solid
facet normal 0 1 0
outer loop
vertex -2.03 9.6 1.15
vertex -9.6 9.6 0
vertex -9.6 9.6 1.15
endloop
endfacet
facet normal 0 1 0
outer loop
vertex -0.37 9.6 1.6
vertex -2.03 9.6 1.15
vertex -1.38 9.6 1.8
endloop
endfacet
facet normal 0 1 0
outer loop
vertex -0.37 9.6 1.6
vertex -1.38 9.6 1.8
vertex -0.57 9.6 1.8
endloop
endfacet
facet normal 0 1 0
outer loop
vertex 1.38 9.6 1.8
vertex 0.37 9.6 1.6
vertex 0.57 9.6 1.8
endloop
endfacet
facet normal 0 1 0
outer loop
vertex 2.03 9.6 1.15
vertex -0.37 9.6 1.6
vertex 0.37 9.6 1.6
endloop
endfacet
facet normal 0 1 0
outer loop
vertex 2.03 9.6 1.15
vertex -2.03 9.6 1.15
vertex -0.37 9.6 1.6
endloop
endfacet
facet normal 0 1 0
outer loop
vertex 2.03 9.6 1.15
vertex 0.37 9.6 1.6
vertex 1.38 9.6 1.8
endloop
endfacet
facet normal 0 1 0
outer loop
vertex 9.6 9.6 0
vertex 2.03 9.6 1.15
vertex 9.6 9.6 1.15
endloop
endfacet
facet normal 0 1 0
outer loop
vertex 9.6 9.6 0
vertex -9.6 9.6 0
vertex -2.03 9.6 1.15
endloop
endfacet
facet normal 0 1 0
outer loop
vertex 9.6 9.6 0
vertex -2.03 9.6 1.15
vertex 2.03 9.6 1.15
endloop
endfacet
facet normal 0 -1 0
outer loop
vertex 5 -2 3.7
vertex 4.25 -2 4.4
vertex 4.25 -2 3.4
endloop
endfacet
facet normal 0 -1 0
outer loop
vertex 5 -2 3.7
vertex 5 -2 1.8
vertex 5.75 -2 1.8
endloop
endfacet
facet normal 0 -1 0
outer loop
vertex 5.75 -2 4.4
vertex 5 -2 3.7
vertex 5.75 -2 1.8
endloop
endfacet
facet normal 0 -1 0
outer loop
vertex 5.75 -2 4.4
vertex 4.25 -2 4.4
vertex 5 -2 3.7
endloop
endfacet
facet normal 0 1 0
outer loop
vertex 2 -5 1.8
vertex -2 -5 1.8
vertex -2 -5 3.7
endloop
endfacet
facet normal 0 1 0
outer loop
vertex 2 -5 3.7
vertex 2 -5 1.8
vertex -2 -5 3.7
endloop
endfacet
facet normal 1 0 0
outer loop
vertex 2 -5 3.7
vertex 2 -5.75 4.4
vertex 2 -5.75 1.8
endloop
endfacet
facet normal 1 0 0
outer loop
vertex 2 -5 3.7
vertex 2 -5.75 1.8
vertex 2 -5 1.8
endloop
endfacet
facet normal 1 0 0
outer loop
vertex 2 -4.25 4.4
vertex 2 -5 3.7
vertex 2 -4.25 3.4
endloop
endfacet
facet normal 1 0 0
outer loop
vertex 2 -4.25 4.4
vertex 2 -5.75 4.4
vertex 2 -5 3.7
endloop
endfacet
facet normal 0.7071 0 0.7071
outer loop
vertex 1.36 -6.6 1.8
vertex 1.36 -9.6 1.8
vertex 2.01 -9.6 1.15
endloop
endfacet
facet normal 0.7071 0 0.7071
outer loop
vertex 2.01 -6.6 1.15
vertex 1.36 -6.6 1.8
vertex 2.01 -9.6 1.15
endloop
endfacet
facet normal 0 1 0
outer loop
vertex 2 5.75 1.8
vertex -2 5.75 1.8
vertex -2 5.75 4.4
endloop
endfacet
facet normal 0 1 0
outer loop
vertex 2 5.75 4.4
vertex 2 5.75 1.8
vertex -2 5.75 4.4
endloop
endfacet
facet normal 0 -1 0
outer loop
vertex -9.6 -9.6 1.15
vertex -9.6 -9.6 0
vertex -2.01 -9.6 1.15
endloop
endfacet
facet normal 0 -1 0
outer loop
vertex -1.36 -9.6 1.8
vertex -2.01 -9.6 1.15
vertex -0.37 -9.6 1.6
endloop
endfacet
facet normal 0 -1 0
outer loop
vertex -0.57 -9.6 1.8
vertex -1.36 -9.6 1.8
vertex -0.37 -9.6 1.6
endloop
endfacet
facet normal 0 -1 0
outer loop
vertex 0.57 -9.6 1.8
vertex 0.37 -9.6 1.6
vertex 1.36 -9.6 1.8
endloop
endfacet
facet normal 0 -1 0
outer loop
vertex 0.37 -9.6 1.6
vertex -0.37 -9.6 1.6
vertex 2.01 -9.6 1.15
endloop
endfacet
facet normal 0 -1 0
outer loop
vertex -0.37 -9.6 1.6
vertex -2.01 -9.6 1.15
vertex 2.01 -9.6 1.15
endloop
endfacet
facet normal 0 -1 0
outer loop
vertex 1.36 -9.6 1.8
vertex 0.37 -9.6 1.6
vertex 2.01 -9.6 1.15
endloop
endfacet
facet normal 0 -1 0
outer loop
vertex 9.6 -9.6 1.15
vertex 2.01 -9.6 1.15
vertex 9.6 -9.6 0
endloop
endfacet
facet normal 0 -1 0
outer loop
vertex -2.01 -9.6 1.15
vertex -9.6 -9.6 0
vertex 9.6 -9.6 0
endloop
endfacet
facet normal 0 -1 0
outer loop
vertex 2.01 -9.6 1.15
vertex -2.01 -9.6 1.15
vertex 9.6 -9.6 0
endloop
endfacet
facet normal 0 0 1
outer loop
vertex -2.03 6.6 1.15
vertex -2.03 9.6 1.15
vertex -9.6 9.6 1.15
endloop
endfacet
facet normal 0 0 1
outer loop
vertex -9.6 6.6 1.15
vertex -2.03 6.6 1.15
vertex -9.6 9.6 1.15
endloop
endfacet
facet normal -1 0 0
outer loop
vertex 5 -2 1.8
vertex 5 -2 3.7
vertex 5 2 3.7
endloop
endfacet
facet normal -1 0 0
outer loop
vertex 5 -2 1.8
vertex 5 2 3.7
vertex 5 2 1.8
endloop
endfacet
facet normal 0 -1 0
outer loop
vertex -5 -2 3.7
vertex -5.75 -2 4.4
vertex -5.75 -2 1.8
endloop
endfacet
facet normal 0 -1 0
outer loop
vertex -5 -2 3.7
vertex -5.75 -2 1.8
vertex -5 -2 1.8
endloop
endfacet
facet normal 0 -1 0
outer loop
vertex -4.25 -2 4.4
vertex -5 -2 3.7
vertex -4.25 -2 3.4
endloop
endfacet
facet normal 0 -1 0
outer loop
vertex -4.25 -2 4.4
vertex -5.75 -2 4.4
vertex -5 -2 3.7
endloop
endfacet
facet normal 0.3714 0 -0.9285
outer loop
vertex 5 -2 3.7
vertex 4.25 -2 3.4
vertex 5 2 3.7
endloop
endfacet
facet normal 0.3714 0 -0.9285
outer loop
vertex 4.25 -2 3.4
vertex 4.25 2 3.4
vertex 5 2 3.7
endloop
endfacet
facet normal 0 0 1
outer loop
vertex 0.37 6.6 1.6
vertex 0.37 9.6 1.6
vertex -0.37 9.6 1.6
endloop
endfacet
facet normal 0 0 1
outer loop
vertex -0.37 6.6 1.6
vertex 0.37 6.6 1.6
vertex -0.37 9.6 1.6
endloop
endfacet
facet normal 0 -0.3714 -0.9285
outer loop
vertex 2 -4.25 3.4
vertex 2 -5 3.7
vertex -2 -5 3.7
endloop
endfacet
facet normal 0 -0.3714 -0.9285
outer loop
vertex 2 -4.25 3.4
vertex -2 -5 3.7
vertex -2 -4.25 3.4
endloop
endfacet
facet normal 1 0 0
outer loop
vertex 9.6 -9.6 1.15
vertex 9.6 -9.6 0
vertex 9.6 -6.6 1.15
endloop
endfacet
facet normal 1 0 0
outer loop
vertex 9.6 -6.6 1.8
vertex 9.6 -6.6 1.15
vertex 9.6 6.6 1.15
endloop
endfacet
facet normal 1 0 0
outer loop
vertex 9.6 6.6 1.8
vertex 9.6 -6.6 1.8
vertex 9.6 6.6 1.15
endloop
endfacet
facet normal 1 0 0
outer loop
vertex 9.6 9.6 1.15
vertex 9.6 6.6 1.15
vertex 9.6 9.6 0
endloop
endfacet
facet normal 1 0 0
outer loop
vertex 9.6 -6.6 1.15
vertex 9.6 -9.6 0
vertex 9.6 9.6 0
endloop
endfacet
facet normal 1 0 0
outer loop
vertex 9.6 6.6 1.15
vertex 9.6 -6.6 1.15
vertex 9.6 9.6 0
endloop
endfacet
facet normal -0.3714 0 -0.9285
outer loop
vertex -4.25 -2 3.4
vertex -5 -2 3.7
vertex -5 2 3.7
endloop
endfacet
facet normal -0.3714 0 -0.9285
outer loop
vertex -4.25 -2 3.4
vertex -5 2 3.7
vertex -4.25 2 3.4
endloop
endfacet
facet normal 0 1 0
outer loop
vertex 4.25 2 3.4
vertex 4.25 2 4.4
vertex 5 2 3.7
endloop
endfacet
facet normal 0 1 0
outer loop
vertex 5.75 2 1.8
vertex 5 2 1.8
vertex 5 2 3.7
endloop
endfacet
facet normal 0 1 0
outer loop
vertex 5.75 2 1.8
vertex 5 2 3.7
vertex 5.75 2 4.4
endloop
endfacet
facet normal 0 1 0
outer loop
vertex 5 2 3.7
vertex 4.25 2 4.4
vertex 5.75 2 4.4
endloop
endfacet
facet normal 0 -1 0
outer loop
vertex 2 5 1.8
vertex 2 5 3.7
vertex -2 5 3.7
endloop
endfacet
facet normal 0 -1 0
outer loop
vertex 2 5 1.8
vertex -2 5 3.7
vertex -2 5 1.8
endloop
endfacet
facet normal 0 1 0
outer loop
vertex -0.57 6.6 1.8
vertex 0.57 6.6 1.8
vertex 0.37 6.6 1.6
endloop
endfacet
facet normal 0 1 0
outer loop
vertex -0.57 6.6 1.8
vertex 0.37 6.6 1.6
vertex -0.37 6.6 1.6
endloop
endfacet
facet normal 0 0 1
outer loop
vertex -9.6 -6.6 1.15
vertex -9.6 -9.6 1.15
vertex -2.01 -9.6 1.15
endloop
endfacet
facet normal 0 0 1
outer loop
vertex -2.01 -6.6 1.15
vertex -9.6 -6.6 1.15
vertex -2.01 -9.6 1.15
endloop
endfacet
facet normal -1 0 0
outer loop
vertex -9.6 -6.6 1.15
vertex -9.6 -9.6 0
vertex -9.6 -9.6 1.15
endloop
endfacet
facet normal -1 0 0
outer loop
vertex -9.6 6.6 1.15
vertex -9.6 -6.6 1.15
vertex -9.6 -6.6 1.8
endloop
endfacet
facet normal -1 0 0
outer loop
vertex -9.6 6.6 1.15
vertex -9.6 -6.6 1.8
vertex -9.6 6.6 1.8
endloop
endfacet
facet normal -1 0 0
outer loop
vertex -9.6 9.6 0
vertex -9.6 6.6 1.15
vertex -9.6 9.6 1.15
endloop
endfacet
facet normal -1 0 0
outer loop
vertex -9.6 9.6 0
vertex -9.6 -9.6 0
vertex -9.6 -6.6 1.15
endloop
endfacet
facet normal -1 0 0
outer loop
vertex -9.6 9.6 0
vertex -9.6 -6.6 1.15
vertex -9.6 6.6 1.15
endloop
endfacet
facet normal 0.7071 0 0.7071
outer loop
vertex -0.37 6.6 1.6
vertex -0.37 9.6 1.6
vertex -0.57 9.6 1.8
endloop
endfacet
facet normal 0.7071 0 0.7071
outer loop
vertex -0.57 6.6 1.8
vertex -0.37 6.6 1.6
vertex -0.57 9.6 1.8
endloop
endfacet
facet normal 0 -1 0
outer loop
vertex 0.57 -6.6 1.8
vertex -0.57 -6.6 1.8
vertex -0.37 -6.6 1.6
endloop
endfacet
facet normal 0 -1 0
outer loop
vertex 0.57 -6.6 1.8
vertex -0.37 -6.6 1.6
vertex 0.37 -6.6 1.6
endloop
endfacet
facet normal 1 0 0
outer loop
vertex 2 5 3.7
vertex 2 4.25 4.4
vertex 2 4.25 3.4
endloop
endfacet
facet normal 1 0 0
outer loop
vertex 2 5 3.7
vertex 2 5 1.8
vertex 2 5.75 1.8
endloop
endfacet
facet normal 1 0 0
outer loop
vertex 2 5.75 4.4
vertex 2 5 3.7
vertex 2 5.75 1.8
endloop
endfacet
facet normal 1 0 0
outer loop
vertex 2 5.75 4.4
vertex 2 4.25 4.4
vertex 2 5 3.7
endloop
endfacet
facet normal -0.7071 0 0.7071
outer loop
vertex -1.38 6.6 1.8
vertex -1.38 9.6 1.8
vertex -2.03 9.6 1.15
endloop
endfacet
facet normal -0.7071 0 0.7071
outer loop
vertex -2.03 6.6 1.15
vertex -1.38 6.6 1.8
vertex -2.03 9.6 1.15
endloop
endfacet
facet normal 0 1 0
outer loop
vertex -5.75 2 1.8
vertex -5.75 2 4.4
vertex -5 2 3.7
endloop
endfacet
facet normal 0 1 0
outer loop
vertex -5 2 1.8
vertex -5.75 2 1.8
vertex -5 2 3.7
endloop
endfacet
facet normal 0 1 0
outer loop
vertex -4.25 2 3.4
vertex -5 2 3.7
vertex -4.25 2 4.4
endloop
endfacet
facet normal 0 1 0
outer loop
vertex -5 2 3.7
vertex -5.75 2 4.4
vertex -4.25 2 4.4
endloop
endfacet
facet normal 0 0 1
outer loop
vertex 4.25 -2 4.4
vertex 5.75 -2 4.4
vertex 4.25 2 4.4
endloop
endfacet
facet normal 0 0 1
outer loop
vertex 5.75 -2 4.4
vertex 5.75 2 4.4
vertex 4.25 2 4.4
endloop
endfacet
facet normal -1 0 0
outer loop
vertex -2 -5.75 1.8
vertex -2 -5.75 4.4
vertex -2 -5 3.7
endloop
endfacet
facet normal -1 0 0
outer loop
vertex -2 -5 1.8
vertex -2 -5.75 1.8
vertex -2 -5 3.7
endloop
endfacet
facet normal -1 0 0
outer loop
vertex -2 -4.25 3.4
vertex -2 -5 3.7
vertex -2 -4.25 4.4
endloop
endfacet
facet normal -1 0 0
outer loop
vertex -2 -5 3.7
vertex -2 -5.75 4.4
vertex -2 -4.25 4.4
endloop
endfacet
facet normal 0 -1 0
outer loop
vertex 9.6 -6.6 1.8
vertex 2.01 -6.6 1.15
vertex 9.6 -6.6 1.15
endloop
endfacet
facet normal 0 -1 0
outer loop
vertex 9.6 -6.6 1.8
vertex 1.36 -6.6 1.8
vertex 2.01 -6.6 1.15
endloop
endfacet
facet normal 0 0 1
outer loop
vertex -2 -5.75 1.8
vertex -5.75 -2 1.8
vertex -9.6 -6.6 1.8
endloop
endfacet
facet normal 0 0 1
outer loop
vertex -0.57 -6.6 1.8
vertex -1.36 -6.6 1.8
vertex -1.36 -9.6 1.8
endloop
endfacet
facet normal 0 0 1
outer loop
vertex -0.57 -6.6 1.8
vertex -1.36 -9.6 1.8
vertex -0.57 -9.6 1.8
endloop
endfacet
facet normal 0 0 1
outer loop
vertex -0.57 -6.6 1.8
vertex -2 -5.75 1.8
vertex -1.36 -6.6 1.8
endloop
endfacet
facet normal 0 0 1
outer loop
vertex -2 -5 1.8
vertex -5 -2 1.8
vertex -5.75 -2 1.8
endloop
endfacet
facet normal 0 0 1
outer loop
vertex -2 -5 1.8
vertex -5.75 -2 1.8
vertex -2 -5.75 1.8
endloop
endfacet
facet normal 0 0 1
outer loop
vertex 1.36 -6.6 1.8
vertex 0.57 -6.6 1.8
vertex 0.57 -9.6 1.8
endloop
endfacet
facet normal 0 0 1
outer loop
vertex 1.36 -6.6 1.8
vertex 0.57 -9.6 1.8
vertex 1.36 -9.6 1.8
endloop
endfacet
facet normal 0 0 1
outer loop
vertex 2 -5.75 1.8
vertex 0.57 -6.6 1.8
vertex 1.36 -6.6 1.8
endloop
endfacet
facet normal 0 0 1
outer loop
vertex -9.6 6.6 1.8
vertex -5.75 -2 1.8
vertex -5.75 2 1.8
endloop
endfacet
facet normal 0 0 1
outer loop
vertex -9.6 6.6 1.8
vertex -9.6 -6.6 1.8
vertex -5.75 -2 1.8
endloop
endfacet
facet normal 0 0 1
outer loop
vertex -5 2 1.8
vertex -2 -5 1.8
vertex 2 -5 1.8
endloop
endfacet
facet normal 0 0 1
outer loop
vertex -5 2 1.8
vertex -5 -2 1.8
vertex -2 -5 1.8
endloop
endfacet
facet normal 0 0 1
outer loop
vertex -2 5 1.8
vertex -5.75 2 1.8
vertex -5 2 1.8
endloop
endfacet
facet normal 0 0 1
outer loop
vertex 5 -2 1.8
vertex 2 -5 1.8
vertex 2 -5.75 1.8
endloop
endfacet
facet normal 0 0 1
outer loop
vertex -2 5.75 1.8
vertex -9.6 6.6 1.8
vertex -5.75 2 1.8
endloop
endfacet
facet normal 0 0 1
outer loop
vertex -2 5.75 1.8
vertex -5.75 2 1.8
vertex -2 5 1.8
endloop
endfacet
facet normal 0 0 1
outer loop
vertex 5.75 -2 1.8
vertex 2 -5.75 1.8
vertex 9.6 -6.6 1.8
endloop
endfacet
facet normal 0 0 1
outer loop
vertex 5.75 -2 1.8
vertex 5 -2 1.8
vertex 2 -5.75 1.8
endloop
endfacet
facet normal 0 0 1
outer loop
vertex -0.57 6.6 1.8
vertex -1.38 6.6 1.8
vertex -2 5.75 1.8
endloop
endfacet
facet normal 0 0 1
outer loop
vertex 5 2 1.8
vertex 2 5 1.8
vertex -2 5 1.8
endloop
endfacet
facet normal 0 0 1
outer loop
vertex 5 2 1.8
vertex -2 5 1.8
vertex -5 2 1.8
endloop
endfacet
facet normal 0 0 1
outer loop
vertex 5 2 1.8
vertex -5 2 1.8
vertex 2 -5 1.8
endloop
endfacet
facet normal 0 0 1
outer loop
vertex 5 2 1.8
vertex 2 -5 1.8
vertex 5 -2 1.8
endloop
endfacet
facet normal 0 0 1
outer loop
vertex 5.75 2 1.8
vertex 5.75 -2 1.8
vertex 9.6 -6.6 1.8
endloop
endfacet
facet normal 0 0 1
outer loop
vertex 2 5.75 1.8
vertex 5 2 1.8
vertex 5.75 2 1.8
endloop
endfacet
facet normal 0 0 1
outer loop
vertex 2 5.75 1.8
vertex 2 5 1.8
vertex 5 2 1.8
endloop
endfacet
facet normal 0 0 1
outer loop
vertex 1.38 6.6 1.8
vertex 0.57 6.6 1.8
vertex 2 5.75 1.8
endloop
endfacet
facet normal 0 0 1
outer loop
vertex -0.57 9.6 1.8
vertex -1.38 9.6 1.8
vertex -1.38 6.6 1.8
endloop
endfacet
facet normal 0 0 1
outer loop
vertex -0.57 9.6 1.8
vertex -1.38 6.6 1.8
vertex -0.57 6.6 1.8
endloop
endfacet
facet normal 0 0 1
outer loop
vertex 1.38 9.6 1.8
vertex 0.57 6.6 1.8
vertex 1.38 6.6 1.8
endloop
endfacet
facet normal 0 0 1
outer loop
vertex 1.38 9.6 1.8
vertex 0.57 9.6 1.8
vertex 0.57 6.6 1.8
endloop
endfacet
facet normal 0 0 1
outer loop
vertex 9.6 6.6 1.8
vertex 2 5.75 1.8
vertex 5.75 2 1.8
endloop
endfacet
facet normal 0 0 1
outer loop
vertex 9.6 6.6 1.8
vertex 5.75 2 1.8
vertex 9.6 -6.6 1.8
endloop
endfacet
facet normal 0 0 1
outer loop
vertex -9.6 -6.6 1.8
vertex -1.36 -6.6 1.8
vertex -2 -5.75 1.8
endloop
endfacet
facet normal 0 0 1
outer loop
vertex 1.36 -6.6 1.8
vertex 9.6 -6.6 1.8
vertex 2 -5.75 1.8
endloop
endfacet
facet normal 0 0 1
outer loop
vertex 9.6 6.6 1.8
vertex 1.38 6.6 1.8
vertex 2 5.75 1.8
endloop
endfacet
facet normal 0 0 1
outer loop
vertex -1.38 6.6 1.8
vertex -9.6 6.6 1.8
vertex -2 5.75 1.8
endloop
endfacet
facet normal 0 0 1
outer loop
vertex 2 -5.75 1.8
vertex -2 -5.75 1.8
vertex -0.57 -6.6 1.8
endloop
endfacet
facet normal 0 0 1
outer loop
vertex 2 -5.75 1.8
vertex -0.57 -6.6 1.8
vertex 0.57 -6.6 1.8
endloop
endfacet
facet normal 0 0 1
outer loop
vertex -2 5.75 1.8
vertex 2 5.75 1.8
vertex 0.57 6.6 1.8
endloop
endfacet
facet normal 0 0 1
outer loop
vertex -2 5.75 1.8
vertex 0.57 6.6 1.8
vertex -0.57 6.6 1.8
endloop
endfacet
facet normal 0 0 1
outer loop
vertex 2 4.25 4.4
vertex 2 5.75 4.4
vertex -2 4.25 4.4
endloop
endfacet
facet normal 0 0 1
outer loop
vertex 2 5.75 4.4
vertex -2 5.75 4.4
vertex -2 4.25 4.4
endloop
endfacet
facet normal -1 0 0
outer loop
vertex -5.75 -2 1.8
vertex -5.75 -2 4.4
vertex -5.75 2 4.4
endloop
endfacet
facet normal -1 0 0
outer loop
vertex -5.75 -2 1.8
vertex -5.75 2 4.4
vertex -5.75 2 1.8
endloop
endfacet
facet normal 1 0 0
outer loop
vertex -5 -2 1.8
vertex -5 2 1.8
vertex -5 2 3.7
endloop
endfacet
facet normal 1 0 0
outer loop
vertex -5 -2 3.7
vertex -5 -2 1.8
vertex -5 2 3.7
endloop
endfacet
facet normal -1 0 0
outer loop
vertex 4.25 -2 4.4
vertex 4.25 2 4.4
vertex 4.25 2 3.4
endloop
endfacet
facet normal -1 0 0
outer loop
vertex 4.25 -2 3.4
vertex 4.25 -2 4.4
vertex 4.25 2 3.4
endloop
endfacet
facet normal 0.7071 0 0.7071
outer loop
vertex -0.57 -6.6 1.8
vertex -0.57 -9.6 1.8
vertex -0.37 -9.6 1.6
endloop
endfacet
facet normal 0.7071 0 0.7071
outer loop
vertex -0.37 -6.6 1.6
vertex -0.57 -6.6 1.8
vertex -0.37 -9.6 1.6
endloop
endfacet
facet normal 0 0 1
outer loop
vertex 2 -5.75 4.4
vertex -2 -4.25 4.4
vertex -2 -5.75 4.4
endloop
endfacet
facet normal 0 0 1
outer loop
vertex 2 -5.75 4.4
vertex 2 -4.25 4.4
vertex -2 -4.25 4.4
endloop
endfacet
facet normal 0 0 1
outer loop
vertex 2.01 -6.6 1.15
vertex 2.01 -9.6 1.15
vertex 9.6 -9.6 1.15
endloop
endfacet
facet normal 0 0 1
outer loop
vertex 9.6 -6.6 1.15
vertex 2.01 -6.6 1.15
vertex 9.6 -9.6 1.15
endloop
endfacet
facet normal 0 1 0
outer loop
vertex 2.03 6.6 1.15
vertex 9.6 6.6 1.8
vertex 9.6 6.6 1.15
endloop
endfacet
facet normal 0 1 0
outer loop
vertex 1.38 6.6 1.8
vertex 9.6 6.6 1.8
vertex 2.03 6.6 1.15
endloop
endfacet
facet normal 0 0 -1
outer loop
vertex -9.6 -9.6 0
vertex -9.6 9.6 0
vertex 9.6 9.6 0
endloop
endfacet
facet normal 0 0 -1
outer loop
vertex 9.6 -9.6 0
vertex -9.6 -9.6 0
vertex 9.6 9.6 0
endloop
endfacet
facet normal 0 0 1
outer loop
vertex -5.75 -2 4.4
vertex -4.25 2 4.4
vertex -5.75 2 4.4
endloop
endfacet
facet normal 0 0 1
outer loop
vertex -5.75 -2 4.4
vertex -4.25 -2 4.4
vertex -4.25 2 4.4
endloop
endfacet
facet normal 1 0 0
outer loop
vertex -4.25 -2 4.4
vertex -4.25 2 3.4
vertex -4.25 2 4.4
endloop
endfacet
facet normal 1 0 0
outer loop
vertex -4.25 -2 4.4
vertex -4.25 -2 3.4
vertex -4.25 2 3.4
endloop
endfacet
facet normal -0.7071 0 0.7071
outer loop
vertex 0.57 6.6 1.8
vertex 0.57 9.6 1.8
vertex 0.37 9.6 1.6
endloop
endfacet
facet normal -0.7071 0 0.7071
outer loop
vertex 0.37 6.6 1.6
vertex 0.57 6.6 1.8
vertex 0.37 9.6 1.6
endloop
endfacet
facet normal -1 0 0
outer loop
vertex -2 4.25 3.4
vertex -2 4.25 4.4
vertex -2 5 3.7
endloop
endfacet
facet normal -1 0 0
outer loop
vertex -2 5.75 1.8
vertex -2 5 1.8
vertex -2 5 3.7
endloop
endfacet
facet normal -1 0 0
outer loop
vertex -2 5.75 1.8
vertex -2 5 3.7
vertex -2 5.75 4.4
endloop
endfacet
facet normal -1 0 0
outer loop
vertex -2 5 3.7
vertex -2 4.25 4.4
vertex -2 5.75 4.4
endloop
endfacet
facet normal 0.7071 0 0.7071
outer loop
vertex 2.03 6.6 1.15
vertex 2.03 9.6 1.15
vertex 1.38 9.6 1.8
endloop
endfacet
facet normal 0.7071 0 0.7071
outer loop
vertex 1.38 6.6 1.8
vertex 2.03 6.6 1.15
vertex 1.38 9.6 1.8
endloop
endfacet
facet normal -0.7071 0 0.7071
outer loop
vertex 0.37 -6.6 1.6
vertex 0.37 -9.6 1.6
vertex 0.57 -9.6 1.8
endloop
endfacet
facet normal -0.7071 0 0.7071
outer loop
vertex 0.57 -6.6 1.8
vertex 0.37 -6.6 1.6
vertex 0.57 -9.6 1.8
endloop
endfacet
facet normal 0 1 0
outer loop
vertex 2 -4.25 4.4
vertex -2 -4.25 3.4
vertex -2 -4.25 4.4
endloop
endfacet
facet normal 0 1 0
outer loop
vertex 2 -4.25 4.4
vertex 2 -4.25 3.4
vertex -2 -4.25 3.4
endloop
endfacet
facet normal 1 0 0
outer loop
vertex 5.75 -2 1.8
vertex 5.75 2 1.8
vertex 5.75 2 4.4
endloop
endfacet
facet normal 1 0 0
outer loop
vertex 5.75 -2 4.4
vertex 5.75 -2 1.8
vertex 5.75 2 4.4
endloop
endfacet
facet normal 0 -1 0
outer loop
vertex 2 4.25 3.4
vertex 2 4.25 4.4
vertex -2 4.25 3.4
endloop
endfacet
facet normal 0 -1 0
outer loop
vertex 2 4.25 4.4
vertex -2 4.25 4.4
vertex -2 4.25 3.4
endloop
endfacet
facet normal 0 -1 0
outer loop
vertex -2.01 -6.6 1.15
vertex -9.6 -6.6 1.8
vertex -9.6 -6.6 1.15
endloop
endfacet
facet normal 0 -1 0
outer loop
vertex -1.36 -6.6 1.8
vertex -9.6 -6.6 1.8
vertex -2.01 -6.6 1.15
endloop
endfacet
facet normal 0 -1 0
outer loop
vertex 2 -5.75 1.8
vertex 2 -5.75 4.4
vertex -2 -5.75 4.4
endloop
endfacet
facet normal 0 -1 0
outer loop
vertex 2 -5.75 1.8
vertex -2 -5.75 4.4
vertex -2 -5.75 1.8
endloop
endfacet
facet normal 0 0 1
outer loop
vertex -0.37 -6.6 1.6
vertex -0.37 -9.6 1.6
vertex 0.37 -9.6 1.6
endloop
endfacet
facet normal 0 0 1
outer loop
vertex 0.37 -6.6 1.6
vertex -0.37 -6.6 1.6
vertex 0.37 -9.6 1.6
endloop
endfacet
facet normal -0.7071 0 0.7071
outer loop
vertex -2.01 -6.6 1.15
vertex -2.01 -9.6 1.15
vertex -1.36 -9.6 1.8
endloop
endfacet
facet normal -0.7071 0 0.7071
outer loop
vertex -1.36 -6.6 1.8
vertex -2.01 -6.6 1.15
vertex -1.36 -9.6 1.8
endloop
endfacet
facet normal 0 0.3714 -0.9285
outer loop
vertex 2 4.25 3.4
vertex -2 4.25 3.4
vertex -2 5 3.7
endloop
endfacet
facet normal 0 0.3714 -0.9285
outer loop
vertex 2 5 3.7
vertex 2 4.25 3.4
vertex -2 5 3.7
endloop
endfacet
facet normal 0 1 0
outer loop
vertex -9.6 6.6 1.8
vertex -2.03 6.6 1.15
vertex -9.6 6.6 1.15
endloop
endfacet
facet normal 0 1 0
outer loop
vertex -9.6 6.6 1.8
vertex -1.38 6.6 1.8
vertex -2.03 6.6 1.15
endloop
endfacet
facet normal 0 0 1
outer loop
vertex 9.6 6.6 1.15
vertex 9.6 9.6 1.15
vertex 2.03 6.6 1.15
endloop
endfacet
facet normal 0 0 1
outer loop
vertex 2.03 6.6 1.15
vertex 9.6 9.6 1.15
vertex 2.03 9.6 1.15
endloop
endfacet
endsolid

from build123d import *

# Parameters (mm, degrees)
F0_W          = 19.2
F0_H          = 19.2
F1_DEPTH      = 1.8
F3_DEPTH      = 3
F5_DEPTH      = 3
F7_DEPTH      = 2
F7_DEPTH_BACK = 2
F9_DEPTH      = 2
F9_DEPTH_BACK = 2


with BuildPart() as f1:
    # F0 (on Top) → F1 (new body)
    with BuildSketch(Plane.XY):
        Rectangle(F0_W, F0_H)
    extrude(amount=F1_DEPTH)

    # F2 (on face) → F3 (cut)
    with BuildSketch(Plane.XZ.offset(9.6)):
        Polygon((-2.01, 1.15), (-1.36, 1.8), (-9.6, 1.8), (-9.6, 1.15), align=None)
        Polygon((0.57, 1.8), (-0.57, 1.8), (-0.37, 1.6), (0.37, 1.6), align=None)
        Polygon((9.6, 1.8), (1.36, 1.8), (2.01, 1.15), (9.6, 1.15), align=None)
    extrude(amount=-F3_DEPTH, mode=Mode.SUBTRACT)

    # F4 (on face) → F5 (cut)
    with BuildSketch(Plane(origin=(0, 9.6, 0), x_dir=(-1, 0, 0), z_dir=(0, 1, 0))):
        Polygon((-9.6, 1.8), (-9.6, 1.15), (-2.03, 1.15), (-1.38, 1.8), align=None)
        Polygon((0.57, 1.8), (-0.57, 1.8), (-0.37, 1.6), (0.37, 1.6), align=None)
        Polygon((2.03, 1.15), (9.6, 1.15), (9.6, 1.8), (1.38, 1.8), align=None)
    extrude(amount=-F5_DEPTH, mode=Mode.SUBTRACT)

    # F6 (on Front) → F7 (join, two sides)
    with BuildSketch(Plane.XZ) as f7_sk:
        Polygon((-5.75, 4.4), (-5.75, 0), (-5, 0), (-5, 3.7), (-4.25, 3.4), (-4.25, 4.4), align=None)
        Polygon((4.25, 3.4), (5, 3.7), (5, 0), (5.75, 0), (5.75, 4.4), (4.25, 4.4), align=None)
    extrude(amount=F7_DEPTH)
    extrude(f7_sk.sketch, amount=-F7_DEPTH_BACK)

    # F8 (on Right) → F9 (join, two sides)
    with BuildSketch(Plane.YZ) as f9_sk:
        Polygon((-5.75, 4.4), (-5.75, 0), (-5, 0), (-5, 3.7), (-4.25, 3.4), (-4.25, 4.4), align=None)
        Polygon((4.25, 4.4), (4.25, 3.4), (5, 3.7), (5, 0), (5.75, 0), (5.75, 4.4), align=None)
    extrude(amount=F9_DEPTH)
    extrude(f9_sk.sketch, amount=-F9_DEPTH_BACK)


solid = f1.part
